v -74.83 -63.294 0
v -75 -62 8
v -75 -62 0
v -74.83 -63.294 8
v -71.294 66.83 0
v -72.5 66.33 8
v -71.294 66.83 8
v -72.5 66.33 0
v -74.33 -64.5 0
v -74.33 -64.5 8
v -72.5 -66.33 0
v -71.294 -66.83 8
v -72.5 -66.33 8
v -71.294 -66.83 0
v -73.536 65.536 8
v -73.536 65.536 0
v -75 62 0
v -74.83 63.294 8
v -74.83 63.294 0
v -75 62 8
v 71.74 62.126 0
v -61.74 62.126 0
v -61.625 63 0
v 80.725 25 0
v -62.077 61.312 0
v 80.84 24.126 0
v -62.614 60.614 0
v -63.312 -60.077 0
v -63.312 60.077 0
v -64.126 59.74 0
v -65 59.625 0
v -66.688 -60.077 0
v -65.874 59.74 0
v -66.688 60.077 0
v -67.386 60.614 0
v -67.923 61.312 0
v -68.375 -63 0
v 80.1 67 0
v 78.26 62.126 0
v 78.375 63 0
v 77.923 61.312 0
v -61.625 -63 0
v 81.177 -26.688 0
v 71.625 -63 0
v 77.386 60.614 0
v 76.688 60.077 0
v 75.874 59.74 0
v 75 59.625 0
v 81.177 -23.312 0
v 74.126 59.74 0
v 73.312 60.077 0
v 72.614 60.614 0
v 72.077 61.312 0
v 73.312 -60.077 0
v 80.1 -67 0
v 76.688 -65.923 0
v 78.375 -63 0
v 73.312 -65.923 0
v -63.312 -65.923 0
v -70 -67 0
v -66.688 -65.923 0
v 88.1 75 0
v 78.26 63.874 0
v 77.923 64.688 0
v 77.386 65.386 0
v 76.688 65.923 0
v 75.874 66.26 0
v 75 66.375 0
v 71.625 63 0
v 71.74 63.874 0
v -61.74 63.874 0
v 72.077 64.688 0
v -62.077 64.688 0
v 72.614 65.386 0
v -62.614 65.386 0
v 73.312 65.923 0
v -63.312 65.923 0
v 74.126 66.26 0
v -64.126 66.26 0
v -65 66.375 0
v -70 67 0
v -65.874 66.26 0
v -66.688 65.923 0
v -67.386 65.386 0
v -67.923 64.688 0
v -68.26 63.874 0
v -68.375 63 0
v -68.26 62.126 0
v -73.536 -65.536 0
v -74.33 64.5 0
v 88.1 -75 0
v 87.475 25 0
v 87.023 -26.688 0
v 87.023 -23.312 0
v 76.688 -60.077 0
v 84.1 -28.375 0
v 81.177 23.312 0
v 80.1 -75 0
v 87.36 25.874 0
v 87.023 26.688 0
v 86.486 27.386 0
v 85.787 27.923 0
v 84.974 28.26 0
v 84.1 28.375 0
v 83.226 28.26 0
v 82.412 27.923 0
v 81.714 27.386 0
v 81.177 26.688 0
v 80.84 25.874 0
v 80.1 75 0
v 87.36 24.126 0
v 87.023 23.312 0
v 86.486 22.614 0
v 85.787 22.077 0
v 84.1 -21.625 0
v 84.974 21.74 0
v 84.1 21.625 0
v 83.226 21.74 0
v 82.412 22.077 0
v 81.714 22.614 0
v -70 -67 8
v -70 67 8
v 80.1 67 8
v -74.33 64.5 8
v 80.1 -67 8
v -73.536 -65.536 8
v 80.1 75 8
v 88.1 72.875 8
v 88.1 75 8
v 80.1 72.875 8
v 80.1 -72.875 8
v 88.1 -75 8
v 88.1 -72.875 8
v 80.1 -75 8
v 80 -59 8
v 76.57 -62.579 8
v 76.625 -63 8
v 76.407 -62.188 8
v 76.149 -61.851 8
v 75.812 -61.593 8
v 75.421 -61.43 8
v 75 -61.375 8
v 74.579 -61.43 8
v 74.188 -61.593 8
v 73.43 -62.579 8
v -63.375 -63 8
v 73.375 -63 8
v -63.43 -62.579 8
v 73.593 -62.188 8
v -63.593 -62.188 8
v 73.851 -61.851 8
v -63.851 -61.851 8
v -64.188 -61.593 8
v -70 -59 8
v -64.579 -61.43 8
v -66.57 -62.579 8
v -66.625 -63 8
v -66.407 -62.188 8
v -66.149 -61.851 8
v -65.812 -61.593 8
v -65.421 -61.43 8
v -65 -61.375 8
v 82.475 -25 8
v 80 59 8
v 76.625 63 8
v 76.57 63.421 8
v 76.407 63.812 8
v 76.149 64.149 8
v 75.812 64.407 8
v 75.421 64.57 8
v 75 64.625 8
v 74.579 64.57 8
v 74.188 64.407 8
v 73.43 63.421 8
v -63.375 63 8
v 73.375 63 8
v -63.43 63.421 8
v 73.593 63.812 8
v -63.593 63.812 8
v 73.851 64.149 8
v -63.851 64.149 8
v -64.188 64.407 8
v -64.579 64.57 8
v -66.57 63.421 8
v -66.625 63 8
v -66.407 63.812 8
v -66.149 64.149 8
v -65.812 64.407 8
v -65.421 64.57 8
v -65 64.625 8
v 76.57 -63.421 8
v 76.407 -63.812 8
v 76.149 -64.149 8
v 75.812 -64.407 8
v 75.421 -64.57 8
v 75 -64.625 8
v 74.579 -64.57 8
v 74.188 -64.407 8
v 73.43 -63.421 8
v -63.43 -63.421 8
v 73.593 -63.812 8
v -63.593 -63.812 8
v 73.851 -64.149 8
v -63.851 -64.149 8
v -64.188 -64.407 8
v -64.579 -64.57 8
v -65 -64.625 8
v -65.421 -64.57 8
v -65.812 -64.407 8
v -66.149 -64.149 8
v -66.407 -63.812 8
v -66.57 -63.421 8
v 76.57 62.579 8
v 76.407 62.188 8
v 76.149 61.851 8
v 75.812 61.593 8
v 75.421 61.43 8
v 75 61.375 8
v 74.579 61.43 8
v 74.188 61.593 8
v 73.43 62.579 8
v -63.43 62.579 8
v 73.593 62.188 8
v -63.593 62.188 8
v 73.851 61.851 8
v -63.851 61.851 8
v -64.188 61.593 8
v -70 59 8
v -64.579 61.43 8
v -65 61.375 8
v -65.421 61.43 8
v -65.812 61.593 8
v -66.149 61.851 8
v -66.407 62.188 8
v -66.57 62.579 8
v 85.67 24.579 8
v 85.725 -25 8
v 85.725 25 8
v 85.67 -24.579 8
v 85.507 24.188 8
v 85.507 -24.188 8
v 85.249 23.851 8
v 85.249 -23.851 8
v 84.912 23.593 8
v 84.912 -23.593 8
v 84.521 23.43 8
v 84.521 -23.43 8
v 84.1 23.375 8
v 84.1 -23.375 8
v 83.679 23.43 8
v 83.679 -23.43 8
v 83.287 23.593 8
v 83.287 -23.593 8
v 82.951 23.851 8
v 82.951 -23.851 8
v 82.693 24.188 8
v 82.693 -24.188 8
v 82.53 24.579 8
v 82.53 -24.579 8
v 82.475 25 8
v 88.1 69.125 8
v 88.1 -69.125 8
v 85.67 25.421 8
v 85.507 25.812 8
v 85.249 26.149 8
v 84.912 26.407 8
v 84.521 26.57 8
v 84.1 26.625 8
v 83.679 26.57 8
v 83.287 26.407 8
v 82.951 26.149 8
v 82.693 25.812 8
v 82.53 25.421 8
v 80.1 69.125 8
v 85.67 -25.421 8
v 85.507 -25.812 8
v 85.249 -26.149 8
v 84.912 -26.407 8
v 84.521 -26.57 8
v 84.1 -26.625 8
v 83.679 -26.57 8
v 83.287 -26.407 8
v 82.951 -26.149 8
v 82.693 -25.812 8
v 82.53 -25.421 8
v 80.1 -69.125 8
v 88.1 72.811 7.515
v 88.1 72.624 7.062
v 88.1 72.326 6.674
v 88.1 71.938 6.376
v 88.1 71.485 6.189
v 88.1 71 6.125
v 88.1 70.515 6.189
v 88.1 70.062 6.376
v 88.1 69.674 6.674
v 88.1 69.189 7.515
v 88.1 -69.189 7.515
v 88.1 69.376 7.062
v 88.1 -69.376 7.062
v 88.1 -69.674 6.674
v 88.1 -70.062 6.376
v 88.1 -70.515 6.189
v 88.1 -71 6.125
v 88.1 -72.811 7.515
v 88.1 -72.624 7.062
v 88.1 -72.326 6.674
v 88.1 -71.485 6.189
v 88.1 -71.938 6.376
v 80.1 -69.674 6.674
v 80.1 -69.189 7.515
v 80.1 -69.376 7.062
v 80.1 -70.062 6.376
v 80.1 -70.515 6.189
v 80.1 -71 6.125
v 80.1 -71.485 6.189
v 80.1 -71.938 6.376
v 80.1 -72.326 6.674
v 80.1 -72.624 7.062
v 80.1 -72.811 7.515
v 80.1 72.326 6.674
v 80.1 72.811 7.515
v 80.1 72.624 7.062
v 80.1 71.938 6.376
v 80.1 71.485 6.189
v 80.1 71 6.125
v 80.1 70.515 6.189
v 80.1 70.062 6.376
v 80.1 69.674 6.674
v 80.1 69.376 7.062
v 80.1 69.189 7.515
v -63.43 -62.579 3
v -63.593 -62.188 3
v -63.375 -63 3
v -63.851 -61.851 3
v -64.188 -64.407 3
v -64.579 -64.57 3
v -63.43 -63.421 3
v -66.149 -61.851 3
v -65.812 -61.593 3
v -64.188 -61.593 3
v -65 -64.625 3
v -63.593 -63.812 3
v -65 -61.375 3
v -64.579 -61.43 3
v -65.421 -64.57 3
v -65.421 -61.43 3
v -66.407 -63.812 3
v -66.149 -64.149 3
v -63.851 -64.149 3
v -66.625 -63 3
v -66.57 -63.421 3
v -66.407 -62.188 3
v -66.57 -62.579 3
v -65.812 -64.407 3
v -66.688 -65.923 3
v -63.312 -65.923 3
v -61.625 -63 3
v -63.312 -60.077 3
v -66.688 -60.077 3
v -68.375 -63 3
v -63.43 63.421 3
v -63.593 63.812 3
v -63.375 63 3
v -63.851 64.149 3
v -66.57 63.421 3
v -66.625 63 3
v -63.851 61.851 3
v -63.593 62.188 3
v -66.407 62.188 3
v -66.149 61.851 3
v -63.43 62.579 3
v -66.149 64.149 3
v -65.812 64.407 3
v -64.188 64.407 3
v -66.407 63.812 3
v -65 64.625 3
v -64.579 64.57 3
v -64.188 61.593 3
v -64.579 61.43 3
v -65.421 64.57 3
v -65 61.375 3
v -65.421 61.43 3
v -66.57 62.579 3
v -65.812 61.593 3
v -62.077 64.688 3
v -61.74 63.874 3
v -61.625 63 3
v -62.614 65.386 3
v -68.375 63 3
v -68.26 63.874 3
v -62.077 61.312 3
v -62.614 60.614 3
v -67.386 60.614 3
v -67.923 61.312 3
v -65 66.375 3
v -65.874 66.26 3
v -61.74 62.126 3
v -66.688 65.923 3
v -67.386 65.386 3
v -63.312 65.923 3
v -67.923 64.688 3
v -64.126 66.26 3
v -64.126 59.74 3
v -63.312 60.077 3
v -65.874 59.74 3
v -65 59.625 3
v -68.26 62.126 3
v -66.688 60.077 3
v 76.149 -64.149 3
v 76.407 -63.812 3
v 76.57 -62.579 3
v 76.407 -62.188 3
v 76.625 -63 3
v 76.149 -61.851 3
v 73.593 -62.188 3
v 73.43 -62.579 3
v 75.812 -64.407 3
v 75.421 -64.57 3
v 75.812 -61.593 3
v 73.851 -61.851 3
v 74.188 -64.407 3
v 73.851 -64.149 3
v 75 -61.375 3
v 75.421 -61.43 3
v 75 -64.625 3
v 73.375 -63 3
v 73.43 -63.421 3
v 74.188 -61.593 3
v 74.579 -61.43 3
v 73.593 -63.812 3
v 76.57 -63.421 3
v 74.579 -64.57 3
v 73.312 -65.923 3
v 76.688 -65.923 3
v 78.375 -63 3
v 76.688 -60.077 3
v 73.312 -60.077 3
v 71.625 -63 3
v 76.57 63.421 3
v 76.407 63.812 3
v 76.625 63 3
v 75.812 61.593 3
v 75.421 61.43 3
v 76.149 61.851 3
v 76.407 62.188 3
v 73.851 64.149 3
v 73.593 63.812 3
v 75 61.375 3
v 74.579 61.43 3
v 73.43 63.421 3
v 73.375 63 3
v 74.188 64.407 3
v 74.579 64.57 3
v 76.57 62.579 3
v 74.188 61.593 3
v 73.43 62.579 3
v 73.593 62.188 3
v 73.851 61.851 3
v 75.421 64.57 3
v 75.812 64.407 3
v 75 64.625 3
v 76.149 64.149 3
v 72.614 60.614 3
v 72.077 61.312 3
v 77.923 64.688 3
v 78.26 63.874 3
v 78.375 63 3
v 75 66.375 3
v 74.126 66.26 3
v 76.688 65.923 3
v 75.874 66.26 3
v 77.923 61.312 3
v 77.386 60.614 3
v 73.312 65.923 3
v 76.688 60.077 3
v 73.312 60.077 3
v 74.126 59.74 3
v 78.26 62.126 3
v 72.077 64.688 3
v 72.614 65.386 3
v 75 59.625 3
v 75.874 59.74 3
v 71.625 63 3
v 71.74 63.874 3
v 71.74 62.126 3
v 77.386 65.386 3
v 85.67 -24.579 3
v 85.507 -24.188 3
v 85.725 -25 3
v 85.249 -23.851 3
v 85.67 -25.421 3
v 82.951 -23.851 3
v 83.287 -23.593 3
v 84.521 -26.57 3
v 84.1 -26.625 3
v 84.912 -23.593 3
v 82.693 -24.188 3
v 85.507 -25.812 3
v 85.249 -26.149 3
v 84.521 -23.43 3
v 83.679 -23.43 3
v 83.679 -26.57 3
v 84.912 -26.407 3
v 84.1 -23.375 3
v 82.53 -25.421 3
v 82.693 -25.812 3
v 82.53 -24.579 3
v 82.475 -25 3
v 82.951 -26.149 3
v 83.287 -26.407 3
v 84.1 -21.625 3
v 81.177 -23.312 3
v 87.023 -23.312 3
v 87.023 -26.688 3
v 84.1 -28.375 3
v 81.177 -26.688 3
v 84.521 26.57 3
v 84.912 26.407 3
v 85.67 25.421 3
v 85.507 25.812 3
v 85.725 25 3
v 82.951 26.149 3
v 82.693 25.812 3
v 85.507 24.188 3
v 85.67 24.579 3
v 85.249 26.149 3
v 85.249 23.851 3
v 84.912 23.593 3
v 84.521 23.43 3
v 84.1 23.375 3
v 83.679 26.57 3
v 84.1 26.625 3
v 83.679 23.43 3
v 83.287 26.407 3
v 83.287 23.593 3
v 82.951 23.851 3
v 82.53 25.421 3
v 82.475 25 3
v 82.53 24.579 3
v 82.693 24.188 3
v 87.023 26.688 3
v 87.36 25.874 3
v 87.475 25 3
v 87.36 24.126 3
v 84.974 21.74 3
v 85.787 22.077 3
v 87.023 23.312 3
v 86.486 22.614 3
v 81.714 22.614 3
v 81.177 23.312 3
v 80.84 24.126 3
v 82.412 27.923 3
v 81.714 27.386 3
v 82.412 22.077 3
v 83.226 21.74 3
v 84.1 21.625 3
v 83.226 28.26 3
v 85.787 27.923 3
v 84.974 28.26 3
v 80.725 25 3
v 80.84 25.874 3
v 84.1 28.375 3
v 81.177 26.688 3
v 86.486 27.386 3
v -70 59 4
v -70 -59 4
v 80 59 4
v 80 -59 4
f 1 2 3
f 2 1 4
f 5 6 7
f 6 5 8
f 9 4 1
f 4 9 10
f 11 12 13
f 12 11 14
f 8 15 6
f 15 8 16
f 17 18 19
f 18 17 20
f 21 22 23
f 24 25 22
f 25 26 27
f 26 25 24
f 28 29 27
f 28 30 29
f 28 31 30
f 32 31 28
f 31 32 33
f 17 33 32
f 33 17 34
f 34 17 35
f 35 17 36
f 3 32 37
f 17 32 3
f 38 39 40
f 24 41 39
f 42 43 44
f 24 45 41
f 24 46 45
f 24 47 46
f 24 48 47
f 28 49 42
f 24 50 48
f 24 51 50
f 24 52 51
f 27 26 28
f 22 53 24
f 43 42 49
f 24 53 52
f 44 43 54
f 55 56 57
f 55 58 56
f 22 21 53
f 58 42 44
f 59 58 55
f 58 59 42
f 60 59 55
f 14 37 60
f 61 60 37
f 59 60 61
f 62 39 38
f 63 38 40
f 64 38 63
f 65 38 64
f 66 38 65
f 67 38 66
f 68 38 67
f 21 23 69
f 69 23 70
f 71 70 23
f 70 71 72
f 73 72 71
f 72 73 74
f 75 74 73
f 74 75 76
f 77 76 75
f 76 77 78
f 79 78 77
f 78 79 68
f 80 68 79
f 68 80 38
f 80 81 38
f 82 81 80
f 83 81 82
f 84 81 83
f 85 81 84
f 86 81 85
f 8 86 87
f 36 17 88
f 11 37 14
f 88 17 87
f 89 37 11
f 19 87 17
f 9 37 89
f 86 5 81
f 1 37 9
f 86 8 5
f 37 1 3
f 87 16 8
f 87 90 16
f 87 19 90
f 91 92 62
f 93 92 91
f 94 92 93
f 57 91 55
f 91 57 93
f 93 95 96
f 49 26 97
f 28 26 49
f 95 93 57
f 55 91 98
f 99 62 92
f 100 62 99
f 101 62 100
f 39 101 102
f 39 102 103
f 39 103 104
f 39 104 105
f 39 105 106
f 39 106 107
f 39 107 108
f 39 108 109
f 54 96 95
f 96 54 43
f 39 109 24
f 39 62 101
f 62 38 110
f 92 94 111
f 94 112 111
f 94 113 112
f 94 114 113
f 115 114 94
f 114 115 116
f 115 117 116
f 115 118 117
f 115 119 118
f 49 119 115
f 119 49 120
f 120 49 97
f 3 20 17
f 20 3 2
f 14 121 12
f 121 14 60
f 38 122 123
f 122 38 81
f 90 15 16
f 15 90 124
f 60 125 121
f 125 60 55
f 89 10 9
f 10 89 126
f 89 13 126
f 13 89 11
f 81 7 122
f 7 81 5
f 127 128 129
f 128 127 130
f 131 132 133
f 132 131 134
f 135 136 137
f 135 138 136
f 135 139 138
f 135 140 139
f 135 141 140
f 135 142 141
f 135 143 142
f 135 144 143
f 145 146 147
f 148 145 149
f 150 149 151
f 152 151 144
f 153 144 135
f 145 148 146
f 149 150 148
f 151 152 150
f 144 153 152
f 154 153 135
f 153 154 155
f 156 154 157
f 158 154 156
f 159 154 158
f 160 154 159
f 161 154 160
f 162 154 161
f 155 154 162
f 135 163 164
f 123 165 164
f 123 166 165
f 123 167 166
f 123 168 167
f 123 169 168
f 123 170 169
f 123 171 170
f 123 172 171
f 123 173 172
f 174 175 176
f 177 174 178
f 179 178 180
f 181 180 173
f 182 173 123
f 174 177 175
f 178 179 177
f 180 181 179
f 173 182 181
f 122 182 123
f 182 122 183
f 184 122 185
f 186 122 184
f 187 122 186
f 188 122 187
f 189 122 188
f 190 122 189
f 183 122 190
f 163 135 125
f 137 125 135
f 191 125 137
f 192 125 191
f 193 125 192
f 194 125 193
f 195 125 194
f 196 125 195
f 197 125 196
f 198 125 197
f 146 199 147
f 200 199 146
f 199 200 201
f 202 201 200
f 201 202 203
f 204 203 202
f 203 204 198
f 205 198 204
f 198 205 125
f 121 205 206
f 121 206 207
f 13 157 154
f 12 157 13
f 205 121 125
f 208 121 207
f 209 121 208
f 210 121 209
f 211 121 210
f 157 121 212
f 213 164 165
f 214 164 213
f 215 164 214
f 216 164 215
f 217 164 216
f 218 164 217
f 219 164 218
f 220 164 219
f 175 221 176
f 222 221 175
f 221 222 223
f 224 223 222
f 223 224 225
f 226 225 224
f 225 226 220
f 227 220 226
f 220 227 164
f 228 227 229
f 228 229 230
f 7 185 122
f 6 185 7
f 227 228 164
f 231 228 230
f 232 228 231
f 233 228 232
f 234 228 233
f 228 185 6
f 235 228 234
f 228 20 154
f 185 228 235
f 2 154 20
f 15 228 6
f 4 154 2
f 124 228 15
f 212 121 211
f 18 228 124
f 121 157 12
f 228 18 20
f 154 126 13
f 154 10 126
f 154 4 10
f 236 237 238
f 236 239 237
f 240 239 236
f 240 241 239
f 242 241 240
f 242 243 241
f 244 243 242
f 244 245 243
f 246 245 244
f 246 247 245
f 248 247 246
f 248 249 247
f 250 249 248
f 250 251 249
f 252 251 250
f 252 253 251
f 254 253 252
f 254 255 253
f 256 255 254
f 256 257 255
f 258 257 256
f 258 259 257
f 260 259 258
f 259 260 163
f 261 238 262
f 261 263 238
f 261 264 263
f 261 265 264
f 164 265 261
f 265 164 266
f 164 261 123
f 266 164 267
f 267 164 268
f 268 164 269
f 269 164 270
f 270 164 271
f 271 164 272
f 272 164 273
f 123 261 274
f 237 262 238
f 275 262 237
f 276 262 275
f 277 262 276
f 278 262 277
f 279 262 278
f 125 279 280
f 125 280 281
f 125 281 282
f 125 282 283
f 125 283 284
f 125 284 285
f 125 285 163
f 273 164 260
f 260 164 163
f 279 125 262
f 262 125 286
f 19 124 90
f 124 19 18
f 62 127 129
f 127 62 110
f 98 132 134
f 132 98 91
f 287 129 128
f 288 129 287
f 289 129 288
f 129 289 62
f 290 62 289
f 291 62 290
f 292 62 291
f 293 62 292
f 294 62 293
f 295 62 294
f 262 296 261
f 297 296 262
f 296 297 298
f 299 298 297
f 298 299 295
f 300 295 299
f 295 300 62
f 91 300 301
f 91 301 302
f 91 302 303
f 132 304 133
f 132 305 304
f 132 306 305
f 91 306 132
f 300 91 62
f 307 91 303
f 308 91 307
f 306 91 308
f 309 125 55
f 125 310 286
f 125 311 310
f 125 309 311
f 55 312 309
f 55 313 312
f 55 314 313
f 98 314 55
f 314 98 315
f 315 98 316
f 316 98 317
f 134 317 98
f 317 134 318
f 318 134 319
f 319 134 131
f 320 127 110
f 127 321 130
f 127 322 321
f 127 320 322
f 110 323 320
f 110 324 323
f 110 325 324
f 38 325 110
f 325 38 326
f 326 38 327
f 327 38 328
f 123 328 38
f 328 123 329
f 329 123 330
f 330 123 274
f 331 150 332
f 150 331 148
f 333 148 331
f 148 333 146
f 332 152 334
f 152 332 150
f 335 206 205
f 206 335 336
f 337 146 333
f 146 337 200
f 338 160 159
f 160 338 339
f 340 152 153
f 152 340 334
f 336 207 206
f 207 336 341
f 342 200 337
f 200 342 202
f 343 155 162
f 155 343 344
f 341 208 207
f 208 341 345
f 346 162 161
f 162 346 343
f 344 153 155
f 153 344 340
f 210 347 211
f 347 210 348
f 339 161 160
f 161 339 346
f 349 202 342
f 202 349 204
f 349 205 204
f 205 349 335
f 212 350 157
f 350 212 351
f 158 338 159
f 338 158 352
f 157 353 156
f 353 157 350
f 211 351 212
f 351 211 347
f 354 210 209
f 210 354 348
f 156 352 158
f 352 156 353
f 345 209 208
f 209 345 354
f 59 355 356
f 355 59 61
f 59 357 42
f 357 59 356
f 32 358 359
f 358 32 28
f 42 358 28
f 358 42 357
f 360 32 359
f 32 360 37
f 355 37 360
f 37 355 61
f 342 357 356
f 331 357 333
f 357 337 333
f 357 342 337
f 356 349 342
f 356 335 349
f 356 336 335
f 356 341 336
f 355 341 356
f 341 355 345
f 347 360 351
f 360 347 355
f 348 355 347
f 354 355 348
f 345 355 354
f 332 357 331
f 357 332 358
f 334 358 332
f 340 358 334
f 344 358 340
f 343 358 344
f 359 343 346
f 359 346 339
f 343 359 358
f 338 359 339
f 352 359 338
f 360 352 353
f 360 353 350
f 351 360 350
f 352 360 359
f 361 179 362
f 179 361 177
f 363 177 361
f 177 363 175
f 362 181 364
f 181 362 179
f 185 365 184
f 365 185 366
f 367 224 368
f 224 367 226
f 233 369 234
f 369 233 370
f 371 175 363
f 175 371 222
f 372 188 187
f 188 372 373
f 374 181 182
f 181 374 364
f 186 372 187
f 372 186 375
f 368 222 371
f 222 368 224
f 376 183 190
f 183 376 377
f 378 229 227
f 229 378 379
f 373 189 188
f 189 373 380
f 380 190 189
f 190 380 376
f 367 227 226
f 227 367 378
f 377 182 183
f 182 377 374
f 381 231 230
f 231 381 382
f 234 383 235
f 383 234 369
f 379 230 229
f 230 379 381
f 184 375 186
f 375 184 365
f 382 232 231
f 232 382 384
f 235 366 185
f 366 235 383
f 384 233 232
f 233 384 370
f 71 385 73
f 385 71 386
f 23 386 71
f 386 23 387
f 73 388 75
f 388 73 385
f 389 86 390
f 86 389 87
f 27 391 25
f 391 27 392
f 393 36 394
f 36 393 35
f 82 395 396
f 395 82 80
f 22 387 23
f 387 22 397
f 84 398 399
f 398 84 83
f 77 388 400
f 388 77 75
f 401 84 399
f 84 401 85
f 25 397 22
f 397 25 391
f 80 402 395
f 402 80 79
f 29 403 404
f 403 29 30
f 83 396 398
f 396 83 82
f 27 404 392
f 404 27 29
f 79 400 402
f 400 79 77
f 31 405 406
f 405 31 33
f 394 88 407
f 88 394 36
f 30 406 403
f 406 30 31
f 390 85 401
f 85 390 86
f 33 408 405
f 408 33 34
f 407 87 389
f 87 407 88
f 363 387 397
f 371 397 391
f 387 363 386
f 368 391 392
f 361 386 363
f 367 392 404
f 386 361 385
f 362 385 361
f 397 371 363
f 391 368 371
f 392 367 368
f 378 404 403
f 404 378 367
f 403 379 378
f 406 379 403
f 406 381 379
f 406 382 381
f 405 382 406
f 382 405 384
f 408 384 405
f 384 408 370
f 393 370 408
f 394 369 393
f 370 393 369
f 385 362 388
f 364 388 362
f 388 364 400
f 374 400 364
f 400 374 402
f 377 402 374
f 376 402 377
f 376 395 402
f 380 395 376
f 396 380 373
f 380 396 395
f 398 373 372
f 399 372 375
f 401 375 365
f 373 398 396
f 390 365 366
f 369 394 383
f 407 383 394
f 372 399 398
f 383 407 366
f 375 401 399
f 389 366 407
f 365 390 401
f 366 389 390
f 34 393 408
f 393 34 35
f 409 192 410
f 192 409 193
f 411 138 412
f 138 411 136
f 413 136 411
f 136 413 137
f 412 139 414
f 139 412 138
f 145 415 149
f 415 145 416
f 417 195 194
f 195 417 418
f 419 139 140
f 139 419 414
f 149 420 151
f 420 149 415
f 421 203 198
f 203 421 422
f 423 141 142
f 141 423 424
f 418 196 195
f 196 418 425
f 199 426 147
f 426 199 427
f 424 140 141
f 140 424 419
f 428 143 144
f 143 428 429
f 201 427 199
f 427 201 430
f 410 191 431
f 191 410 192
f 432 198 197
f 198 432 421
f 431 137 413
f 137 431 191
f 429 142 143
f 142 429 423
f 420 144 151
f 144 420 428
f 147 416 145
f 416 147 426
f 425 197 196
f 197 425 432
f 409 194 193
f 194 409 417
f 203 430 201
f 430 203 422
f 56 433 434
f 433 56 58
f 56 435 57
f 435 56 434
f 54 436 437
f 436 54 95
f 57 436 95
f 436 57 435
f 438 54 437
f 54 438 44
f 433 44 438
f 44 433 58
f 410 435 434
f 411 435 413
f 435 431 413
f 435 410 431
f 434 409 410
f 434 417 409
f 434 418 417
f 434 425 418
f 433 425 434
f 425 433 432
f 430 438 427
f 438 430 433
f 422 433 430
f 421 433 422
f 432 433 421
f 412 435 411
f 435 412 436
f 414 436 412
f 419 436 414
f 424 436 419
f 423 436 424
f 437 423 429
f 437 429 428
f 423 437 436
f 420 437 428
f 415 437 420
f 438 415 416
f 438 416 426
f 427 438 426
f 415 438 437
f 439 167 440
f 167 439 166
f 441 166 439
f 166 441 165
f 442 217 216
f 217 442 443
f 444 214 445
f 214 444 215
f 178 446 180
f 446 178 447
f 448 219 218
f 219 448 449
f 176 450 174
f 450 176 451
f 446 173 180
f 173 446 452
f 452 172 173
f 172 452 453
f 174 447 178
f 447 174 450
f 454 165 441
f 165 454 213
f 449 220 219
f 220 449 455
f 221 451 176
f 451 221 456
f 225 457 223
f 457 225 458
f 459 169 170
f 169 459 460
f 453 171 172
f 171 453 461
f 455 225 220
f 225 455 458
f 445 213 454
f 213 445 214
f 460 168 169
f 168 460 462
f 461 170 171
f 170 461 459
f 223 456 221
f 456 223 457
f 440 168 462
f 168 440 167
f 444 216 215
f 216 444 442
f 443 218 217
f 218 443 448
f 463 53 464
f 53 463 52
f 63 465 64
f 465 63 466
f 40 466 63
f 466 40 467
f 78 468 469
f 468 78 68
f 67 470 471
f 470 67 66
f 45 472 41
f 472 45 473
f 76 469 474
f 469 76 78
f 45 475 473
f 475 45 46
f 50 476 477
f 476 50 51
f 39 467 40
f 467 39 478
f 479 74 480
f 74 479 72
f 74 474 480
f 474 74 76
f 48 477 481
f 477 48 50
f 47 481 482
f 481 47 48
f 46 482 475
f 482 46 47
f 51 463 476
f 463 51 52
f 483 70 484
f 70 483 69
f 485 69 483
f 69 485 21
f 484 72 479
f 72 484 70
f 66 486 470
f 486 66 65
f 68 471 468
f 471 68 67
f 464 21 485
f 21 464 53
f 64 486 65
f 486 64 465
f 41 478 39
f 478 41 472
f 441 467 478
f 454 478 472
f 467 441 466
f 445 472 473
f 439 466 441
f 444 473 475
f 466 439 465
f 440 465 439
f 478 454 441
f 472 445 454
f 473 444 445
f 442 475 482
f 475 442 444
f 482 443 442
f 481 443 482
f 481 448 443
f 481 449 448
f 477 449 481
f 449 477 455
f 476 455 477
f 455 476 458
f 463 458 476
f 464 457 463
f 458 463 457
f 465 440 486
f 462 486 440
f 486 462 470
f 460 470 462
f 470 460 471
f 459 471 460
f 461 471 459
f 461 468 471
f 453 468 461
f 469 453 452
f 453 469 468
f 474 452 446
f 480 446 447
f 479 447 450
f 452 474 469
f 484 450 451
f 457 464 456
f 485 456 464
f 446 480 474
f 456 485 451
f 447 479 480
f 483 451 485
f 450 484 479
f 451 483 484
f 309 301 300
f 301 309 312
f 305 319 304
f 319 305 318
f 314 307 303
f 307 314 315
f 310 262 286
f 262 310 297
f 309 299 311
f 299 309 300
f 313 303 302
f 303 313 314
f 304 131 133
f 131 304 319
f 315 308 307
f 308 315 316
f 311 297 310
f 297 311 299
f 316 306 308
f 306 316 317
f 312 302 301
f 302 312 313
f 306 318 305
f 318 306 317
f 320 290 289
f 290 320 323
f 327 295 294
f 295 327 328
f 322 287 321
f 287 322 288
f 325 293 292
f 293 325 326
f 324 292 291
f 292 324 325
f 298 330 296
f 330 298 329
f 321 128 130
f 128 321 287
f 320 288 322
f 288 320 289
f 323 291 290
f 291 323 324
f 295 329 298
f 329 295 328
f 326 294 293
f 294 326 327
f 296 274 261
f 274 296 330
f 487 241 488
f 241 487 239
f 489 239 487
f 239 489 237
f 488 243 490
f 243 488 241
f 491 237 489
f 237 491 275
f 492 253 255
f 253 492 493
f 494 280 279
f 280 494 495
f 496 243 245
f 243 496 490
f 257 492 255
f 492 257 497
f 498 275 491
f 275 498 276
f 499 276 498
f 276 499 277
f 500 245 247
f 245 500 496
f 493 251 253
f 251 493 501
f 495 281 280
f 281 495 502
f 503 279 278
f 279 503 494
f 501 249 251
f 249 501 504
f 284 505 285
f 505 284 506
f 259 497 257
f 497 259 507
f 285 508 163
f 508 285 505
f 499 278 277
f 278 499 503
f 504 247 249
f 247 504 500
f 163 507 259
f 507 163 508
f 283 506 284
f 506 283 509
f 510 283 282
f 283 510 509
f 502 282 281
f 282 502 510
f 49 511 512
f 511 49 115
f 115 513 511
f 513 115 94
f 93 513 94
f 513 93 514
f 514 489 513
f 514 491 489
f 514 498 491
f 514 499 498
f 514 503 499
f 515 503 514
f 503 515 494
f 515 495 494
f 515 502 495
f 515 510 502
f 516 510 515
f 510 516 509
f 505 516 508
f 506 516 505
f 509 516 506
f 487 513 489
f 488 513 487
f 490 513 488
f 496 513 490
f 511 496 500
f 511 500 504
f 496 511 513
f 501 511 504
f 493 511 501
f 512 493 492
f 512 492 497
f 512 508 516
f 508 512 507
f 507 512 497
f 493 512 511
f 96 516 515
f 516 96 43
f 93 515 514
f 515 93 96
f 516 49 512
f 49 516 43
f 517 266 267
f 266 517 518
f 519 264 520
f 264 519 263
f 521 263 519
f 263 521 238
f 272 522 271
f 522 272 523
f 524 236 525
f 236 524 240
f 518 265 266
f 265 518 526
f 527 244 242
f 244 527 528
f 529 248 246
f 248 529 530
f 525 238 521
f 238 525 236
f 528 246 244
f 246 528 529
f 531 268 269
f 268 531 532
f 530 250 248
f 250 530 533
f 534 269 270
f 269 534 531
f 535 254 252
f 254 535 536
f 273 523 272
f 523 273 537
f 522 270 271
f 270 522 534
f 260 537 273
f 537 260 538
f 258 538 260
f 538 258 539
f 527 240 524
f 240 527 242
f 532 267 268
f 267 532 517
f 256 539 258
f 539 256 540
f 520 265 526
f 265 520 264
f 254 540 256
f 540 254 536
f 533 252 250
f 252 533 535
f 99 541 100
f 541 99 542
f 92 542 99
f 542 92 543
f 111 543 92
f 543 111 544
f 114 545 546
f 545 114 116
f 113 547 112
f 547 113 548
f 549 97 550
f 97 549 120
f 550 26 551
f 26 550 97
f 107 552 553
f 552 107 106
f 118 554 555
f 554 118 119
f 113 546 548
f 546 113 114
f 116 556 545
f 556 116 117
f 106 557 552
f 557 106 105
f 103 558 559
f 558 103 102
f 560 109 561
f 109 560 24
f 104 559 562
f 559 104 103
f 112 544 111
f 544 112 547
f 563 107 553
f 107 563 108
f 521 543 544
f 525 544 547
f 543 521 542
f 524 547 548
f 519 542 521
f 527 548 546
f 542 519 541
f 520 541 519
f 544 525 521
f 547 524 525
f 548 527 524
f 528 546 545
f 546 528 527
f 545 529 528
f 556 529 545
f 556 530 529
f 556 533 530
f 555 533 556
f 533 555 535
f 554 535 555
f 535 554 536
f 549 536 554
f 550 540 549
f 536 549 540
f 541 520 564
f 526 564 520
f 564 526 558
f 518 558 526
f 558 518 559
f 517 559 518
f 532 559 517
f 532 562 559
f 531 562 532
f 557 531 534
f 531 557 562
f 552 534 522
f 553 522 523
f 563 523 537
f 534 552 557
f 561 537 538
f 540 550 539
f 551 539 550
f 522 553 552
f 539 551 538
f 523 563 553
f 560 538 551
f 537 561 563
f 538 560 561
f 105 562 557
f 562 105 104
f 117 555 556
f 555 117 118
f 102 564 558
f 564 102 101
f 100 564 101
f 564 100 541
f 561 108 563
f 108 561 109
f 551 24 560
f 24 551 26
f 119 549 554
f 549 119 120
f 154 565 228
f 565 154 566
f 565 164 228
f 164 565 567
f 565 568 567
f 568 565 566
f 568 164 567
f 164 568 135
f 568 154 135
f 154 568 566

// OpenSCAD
// file: ../OpenSCAD_Modules/cube_vround.scad
module cube_vround(
	size=[10,10,10],
	round_corners=[true,true,true,true],
	rounding=3,
	center_xy=false,
	center_z=false,
	attach=0,
	wall_attach=0,
	quality=2, //integer from 1 to infinity
)
{
	assert(len(size)==3);
	assert(len(round_corners)==4);
	assert(rounding>0);
	assert(rounding<=size[0]/2);
	assert(rounding<=size[1]/2);
	assert(quality>0);
	assert(attach>=0);
	assert(wall_attach>=0);
	height=size[2]+attach;
	cyl_r=rounding+wall_attach;
	cyl_mvx=size[0]/2-rounding;
	cyl_mvy=size[1]/2-rounding;
	cube_szx=size[0]/2;
	cube_szy=size[1]/2;
	cube_mvx=cube_szx/2+wall_attach;
	cube_mvy=cube_szy/2+wall_attach;
	translate([center_xy?0:cube_szx,center_xy?0:cube_szy,center_z?-attach/2:(size[2]-attach)/2])
		hull()
		{
			if(round_corners[0])
				translate([cyl_mvx,cyl_mvy])
					cylinder(r=cyl_r,h=height,$fn=12*quality,center=true);
			else
				translate([cube_mvx,cube_mvy])
					cube([cube_szx,cube_szy,height],center=true);
			if(round_corners[1])
				translate([cyl_mvx,-cyl_mvy])
					cylinder(r=cyl_r,h=height,$fn=12*quality,center=true);
			else
				translate([cube_mvx,-cube_mvy])
					cube([cube_szx,cube_szy,height],center=true);
			if(round_corners[2])
				translate([-cyl_mvx,-cyl_mvy])
					cylinder(r=cyl_r,h=height,$fn=12*quality,center=true);
			else
				translate([-cube_mvx,-cube_mvy])
					cube([cube_szx,cube_szy,height],center=true);
			if(round_corners[3])
				translate([-cyl_mvx,cyl_mvy])
					cylinder(r=cyl_r,h=height,$fn=12*quality,center=true);
			else
				translate([-cube_mvx,cube_mvy])
					cube([cube_szx,cube_szy,height],center=true);
		};
}

//example
cube_vround(round_corners=[true,false,true,false],
size=[10,20,6],
attach=0.1,
wall_attach=0.1,
rounding=3,
center_xy=true,center_z=false);
// main file
use <../OpenSCAD_Modules/cube_vround.scad>


module HNut
(
	nutDiam=6.75,
	nutHeight=3,
	topClr=0.1,
)
{
	union()
	{
		translate([0,0,topClr/2])
		cylinder(d=nutDiam,h=nutHeight+topClr,center=true,$fn=6);
	}
}

module HHead
(
	headDiam=6.75,
	headHeight=3,
	topClr=0.1,
	quality=2,
)
{
	union()
	{
		translate([0,0,topClr/2])
		cylinder(d=headDiam,h=headHeight+topClr,center=true,$fn=12*quality);
	}
}

module VNutPocket
(
	nutDiam=6.75,
	nutHeight=3,
	pocketLen=10,
)
{
	m=(nutDiam/2)*sqrt(3)/2;
	rotate(a=90,v=[0,0,1])
		rotate(a=90,v=[0,-1,0])
			union()
			{
				cylinder(d=nutDiam,h=nutHeight,center=true,$fn=6);
				translate([pocketLen/2,0,0])
				cube(size=[pocketLen,m*2,nutHeight],center=true);
			}
}

module CartridgeCaseHalf
(
	ext_size=[160,134,8],
	int_size=[150,118,4],
	handle_size=[8,150],
	handle_shift=-4.9,
	xshift=5,
	vscrew_diam=3.25,
	hscrew_diam=3.75,
	vscrew_diff=[140,134-(134-118)/2],
	hscrew_diff=142,
	vhscrew_diff=50,
	nutHeight=3,
	quality=2
)
{
	cutClr=1;
	rounding=5;
	translate([xshift,0,0])
	difference()
	{
		union()
		{
			//base
			translate([cutClr/2,0,0])
			cube_vround(size=[ext_size[0]+cutClr,ext_size[1],ext_size[2]],center_xy=true,rounding=rounding,quality=quality,round_corners=[false,false,true,true]);
			//handle
			translate([ext_size[0]/2+handle_size[0]/2+handle_shift,0,0])
			cube_vround(size=[handle_size[0],handle_size[1],ext_size[2]],center_xy=true,rounding=0.001,quality=quality,round_corners=[false,false,false,false]);
		}
		//filter place
		translate([0,0,ext_size[2]-int_size[2]])
		cube_vround(size=[int_size[0],int_size[1],int_size[2]+cutClr],center_xy=true,round_corners=[false,false,false,false]);
		//screw holes with nuts/head cuts
		for (i=[-1:2:1],j=[-1:2:1])
		{
			translate([i*vscrew_diff[0]/2,j*vscrew_diff[1]/2,0])
			cylinder(d=vscrew_diam, h=(ext_size[2]+cutClr)*2, center=true, $fn=12*quality);

			translate([i*vscrew_diff[0]/2,j*vscrew_diff[1]/2,nutHeight/2-cutClr])
			if(j<0)
				HNut(topClr=cutClr,nutHeight=nutHeight);
			else
				HHead(topClr=cutClr,headHeight=nutHeight);
		}
		//horizontal screw holes
		for (j=[-1:2:1])
		{
			translate([0,j*hscrew_diff/2,ext_size[2]])
			rotate(a=90,v=[0,1,0])
			cylinder(d=hscrew_diam, h=ext_size[0]*2, center=true, $fn=12*quality);
		}
		//vertical handle screw holes
		for (j=[-1:2:1])
		{
			translate([ext_size[0]/2+handle_size[0]/2+handle_shift,j*vhscrew_diff/2,0])
			cylinder(d=vscrew_diam, h=(ext_size[2]+cutClr)*2, center=true, $fn=12*quality);

			translate([ext_size[0]/2+handle_size[0]/2+handle_shift,j*vhscrew_diff/2,nutHeight/2-cutClr])
			if(j<0)
				rotate(a=180/6,v=[0,0,1])
				HNut(topClr=cutClr,nutHeight=nutHeight);
			else
				HHead(topClr=cutClr,headHeight=nutHeight);
		}
	}
}

CartridgeCaseHalf();
